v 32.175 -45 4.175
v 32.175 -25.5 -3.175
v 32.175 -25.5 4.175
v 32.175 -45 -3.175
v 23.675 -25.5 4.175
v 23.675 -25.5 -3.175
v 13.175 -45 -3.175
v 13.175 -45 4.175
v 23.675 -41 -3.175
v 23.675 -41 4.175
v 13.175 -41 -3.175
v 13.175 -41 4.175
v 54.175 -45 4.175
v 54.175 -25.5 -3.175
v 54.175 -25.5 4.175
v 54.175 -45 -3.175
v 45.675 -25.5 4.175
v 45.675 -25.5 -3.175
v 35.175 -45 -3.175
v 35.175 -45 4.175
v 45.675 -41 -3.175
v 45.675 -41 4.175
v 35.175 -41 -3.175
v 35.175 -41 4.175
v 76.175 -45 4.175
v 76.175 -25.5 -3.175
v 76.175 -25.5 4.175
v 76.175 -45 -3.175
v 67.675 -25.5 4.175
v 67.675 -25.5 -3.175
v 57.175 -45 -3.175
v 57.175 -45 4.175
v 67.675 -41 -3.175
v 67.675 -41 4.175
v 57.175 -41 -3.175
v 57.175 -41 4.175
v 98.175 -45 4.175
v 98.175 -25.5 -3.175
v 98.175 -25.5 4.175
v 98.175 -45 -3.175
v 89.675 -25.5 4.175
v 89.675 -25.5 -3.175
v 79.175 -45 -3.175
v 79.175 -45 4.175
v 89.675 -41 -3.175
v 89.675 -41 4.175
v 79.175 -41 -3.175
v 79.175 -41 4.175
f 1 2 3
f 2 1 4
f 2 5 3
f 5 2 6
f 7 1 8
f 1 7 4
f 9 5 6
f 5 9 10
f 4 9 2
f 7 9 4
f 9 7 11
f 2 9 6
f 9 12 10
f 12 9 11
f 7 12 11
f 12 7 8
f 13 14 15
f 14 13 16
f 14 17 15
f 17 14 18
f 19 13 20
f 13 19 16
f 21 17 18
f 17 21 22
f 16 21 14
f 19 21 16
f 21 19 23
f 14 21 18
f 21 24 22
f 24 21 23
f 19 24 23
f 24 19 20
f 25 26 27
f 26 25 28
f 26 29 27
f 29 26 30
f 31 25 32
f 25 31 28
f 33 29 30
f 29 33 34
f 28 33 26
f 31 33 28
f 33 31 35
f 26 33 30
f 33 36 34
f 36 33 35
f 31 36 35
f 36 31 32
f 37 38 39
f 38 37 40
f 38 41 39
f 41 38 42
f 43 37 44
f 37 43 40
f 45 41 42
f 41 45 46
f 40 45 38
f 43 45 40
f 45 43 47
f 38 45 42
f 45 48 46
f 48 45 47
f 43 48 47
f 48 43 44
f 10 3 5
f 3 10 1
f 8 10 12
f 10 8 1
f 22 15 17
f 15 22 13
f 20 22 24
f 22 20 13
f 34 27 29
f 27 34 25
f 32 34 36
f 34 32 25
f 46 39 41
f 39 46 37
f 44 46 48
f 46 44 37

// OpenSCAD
// Branch values
branch_initial_width = 30;
branch_length = 170;
branch_width = 100;

// Hook values
hook_depth = 18;
branch_hook_stem_width = 10;
support_hook_stem_width = 4;
error_margin = 0.5;

// Support pillar values
support_pillar_width = 19;

// Constants
branch_thickness = 25.4/4;

// Computed values
a = branch_length;
b = branch_width;
c = branch_initial_width;
external_radius = (a*a+b*b)/(2*b);
internal_radius = (a*a+(b-c)*(b-c))/(2*(b-c));

module BranchHook() {
  translate([0,
             -(branch_initial_width-support_hook_stem_width-error_margin),
             -branch_thickness/2]){
    cube([hook_depth/2-error_margin,
          branch_initial_width-support_hook_stem_width-error_margin,
          branch_thickness]);
  }
  translate([hook_depth/2-error_margin,
             -branch_hook_stem_width,
             -branch_thickness/2]) {
    cube([hook_depth/2+error_margin,
          branch_hook_stem_width,
          branch_thickness]);
  }
}

*BranchHook();

module Branch() {
  translate([hook_depth,0,0]) {
    difference() {
      translate([0,-external_radius,0]) {
        cylinder(r=external_radius, h=branch_thickness, $fn=1000, center=true);
      }
      translate([-external_radius-1,-2*external_radius-1,-branch_thickness]) {
        cube([external_radius+1,2*external_radius+2,2*branch_thickness]);
      }
      translate([0,-branch_initial_width-internal_radius,0]) {
        cylinder(r=internal_radius, h=2*branch_thickness, $fn=1000, center=true);
      }
    }
  }
  BranchHook();
}

*Branch();

module TranslatedBranch() {
  rotate([90,0,0]) {
    translate([branch_thickness/2+support_pillar_width-hook_depth+error_margin,
               0,
               0]) {
      Branch();
    }
  }
}

*TranslatedBranch();

module CenterSupportHook() {
  translate([support_pillar_width+(branch_thickness-hook_depth)/2+error_margin,
             -branch_thickness/2,
             -branch_initial_width]) {
    cube([hook_depth/2-error_margin,
          branch_thickness,
          branch_initial_width-branch_hook_stem_width-error_margin]);
  }
  translate([branch_thickness/2,
             -branch_thickness/2,
             -branch_initial_width]) {
    cube([support_pillar_width-hook_depth/2+error_margin,
          branch_thickness,
          support_hook_stem_width]);
  }
}

*CenterSupportHook();

module CenterSupportPillar() {
  translate([branch_thickness/2,branch_thickness/2,-branch_initial_width]) {
    linear_extrude(height=branch_initial_width) {
      polygon([[0,0],[0,support_pillar_width],[support_pillar_width,0]],
              convexity = N);
    }
  }
}

*CenterSupportPillar();

module CenterSupportPillarAndHook() {
  CenterSupportPillar();
  CenterSupportHook();
}

*CenterSupportPillarAndHook();

module CenterSupport() {
  for (i=[0:3]) {
    rotate([0,0,90*i]) CenterSupportPillarAndHook();
  }
}

*CenterSupport();

module Mobile() {
  for (i=[0:3]) {
    rotate([0,0,90*i]) TranslatedBranch();
  }
  CenterSupport();
}

*Mobile();



// Sheet placement values
number_of_branches = 0;
number_of_hooks = 4;
sheet_width = 210;
sheet_height = 220;
piece_extra_thickness = 1;
branch_separation = 4;
hook_separation = 3;
top_corner_separation = 10;
branch_to_hook_separation = 5;

module ToCut() {
  for(i=[0:piece_extra_thickness]) {
    translate([0,0,i]) {
      if (number_of_branches > 0) {
        for (j=[0:number_of_branches-1]) {
          translate([0,-(branch_initial_width+branch_separation)*j,0]) Branch();
        }
      }
      translate([0,
                 -number_of_branches*(branch_initial_width+branch_separation) - branch_to_hook_separation,
                 0]) {
        for(j=[0:number_of_hooks-1]) {
          translate([(support_pillar_width+hook_separation)*j,0,0]) {
            rotate([-90,0,0]) {
              translate([0,0,0]) CenterSupportHook();
            }
          }
        }
      }
    }
  }
}

*color("gray") translate([0,-sheet_height,0]) cube([sheet_width,sheet_height,1]);
translate([top_corner_separation,-top_corner_separation,0]) ToCut();
